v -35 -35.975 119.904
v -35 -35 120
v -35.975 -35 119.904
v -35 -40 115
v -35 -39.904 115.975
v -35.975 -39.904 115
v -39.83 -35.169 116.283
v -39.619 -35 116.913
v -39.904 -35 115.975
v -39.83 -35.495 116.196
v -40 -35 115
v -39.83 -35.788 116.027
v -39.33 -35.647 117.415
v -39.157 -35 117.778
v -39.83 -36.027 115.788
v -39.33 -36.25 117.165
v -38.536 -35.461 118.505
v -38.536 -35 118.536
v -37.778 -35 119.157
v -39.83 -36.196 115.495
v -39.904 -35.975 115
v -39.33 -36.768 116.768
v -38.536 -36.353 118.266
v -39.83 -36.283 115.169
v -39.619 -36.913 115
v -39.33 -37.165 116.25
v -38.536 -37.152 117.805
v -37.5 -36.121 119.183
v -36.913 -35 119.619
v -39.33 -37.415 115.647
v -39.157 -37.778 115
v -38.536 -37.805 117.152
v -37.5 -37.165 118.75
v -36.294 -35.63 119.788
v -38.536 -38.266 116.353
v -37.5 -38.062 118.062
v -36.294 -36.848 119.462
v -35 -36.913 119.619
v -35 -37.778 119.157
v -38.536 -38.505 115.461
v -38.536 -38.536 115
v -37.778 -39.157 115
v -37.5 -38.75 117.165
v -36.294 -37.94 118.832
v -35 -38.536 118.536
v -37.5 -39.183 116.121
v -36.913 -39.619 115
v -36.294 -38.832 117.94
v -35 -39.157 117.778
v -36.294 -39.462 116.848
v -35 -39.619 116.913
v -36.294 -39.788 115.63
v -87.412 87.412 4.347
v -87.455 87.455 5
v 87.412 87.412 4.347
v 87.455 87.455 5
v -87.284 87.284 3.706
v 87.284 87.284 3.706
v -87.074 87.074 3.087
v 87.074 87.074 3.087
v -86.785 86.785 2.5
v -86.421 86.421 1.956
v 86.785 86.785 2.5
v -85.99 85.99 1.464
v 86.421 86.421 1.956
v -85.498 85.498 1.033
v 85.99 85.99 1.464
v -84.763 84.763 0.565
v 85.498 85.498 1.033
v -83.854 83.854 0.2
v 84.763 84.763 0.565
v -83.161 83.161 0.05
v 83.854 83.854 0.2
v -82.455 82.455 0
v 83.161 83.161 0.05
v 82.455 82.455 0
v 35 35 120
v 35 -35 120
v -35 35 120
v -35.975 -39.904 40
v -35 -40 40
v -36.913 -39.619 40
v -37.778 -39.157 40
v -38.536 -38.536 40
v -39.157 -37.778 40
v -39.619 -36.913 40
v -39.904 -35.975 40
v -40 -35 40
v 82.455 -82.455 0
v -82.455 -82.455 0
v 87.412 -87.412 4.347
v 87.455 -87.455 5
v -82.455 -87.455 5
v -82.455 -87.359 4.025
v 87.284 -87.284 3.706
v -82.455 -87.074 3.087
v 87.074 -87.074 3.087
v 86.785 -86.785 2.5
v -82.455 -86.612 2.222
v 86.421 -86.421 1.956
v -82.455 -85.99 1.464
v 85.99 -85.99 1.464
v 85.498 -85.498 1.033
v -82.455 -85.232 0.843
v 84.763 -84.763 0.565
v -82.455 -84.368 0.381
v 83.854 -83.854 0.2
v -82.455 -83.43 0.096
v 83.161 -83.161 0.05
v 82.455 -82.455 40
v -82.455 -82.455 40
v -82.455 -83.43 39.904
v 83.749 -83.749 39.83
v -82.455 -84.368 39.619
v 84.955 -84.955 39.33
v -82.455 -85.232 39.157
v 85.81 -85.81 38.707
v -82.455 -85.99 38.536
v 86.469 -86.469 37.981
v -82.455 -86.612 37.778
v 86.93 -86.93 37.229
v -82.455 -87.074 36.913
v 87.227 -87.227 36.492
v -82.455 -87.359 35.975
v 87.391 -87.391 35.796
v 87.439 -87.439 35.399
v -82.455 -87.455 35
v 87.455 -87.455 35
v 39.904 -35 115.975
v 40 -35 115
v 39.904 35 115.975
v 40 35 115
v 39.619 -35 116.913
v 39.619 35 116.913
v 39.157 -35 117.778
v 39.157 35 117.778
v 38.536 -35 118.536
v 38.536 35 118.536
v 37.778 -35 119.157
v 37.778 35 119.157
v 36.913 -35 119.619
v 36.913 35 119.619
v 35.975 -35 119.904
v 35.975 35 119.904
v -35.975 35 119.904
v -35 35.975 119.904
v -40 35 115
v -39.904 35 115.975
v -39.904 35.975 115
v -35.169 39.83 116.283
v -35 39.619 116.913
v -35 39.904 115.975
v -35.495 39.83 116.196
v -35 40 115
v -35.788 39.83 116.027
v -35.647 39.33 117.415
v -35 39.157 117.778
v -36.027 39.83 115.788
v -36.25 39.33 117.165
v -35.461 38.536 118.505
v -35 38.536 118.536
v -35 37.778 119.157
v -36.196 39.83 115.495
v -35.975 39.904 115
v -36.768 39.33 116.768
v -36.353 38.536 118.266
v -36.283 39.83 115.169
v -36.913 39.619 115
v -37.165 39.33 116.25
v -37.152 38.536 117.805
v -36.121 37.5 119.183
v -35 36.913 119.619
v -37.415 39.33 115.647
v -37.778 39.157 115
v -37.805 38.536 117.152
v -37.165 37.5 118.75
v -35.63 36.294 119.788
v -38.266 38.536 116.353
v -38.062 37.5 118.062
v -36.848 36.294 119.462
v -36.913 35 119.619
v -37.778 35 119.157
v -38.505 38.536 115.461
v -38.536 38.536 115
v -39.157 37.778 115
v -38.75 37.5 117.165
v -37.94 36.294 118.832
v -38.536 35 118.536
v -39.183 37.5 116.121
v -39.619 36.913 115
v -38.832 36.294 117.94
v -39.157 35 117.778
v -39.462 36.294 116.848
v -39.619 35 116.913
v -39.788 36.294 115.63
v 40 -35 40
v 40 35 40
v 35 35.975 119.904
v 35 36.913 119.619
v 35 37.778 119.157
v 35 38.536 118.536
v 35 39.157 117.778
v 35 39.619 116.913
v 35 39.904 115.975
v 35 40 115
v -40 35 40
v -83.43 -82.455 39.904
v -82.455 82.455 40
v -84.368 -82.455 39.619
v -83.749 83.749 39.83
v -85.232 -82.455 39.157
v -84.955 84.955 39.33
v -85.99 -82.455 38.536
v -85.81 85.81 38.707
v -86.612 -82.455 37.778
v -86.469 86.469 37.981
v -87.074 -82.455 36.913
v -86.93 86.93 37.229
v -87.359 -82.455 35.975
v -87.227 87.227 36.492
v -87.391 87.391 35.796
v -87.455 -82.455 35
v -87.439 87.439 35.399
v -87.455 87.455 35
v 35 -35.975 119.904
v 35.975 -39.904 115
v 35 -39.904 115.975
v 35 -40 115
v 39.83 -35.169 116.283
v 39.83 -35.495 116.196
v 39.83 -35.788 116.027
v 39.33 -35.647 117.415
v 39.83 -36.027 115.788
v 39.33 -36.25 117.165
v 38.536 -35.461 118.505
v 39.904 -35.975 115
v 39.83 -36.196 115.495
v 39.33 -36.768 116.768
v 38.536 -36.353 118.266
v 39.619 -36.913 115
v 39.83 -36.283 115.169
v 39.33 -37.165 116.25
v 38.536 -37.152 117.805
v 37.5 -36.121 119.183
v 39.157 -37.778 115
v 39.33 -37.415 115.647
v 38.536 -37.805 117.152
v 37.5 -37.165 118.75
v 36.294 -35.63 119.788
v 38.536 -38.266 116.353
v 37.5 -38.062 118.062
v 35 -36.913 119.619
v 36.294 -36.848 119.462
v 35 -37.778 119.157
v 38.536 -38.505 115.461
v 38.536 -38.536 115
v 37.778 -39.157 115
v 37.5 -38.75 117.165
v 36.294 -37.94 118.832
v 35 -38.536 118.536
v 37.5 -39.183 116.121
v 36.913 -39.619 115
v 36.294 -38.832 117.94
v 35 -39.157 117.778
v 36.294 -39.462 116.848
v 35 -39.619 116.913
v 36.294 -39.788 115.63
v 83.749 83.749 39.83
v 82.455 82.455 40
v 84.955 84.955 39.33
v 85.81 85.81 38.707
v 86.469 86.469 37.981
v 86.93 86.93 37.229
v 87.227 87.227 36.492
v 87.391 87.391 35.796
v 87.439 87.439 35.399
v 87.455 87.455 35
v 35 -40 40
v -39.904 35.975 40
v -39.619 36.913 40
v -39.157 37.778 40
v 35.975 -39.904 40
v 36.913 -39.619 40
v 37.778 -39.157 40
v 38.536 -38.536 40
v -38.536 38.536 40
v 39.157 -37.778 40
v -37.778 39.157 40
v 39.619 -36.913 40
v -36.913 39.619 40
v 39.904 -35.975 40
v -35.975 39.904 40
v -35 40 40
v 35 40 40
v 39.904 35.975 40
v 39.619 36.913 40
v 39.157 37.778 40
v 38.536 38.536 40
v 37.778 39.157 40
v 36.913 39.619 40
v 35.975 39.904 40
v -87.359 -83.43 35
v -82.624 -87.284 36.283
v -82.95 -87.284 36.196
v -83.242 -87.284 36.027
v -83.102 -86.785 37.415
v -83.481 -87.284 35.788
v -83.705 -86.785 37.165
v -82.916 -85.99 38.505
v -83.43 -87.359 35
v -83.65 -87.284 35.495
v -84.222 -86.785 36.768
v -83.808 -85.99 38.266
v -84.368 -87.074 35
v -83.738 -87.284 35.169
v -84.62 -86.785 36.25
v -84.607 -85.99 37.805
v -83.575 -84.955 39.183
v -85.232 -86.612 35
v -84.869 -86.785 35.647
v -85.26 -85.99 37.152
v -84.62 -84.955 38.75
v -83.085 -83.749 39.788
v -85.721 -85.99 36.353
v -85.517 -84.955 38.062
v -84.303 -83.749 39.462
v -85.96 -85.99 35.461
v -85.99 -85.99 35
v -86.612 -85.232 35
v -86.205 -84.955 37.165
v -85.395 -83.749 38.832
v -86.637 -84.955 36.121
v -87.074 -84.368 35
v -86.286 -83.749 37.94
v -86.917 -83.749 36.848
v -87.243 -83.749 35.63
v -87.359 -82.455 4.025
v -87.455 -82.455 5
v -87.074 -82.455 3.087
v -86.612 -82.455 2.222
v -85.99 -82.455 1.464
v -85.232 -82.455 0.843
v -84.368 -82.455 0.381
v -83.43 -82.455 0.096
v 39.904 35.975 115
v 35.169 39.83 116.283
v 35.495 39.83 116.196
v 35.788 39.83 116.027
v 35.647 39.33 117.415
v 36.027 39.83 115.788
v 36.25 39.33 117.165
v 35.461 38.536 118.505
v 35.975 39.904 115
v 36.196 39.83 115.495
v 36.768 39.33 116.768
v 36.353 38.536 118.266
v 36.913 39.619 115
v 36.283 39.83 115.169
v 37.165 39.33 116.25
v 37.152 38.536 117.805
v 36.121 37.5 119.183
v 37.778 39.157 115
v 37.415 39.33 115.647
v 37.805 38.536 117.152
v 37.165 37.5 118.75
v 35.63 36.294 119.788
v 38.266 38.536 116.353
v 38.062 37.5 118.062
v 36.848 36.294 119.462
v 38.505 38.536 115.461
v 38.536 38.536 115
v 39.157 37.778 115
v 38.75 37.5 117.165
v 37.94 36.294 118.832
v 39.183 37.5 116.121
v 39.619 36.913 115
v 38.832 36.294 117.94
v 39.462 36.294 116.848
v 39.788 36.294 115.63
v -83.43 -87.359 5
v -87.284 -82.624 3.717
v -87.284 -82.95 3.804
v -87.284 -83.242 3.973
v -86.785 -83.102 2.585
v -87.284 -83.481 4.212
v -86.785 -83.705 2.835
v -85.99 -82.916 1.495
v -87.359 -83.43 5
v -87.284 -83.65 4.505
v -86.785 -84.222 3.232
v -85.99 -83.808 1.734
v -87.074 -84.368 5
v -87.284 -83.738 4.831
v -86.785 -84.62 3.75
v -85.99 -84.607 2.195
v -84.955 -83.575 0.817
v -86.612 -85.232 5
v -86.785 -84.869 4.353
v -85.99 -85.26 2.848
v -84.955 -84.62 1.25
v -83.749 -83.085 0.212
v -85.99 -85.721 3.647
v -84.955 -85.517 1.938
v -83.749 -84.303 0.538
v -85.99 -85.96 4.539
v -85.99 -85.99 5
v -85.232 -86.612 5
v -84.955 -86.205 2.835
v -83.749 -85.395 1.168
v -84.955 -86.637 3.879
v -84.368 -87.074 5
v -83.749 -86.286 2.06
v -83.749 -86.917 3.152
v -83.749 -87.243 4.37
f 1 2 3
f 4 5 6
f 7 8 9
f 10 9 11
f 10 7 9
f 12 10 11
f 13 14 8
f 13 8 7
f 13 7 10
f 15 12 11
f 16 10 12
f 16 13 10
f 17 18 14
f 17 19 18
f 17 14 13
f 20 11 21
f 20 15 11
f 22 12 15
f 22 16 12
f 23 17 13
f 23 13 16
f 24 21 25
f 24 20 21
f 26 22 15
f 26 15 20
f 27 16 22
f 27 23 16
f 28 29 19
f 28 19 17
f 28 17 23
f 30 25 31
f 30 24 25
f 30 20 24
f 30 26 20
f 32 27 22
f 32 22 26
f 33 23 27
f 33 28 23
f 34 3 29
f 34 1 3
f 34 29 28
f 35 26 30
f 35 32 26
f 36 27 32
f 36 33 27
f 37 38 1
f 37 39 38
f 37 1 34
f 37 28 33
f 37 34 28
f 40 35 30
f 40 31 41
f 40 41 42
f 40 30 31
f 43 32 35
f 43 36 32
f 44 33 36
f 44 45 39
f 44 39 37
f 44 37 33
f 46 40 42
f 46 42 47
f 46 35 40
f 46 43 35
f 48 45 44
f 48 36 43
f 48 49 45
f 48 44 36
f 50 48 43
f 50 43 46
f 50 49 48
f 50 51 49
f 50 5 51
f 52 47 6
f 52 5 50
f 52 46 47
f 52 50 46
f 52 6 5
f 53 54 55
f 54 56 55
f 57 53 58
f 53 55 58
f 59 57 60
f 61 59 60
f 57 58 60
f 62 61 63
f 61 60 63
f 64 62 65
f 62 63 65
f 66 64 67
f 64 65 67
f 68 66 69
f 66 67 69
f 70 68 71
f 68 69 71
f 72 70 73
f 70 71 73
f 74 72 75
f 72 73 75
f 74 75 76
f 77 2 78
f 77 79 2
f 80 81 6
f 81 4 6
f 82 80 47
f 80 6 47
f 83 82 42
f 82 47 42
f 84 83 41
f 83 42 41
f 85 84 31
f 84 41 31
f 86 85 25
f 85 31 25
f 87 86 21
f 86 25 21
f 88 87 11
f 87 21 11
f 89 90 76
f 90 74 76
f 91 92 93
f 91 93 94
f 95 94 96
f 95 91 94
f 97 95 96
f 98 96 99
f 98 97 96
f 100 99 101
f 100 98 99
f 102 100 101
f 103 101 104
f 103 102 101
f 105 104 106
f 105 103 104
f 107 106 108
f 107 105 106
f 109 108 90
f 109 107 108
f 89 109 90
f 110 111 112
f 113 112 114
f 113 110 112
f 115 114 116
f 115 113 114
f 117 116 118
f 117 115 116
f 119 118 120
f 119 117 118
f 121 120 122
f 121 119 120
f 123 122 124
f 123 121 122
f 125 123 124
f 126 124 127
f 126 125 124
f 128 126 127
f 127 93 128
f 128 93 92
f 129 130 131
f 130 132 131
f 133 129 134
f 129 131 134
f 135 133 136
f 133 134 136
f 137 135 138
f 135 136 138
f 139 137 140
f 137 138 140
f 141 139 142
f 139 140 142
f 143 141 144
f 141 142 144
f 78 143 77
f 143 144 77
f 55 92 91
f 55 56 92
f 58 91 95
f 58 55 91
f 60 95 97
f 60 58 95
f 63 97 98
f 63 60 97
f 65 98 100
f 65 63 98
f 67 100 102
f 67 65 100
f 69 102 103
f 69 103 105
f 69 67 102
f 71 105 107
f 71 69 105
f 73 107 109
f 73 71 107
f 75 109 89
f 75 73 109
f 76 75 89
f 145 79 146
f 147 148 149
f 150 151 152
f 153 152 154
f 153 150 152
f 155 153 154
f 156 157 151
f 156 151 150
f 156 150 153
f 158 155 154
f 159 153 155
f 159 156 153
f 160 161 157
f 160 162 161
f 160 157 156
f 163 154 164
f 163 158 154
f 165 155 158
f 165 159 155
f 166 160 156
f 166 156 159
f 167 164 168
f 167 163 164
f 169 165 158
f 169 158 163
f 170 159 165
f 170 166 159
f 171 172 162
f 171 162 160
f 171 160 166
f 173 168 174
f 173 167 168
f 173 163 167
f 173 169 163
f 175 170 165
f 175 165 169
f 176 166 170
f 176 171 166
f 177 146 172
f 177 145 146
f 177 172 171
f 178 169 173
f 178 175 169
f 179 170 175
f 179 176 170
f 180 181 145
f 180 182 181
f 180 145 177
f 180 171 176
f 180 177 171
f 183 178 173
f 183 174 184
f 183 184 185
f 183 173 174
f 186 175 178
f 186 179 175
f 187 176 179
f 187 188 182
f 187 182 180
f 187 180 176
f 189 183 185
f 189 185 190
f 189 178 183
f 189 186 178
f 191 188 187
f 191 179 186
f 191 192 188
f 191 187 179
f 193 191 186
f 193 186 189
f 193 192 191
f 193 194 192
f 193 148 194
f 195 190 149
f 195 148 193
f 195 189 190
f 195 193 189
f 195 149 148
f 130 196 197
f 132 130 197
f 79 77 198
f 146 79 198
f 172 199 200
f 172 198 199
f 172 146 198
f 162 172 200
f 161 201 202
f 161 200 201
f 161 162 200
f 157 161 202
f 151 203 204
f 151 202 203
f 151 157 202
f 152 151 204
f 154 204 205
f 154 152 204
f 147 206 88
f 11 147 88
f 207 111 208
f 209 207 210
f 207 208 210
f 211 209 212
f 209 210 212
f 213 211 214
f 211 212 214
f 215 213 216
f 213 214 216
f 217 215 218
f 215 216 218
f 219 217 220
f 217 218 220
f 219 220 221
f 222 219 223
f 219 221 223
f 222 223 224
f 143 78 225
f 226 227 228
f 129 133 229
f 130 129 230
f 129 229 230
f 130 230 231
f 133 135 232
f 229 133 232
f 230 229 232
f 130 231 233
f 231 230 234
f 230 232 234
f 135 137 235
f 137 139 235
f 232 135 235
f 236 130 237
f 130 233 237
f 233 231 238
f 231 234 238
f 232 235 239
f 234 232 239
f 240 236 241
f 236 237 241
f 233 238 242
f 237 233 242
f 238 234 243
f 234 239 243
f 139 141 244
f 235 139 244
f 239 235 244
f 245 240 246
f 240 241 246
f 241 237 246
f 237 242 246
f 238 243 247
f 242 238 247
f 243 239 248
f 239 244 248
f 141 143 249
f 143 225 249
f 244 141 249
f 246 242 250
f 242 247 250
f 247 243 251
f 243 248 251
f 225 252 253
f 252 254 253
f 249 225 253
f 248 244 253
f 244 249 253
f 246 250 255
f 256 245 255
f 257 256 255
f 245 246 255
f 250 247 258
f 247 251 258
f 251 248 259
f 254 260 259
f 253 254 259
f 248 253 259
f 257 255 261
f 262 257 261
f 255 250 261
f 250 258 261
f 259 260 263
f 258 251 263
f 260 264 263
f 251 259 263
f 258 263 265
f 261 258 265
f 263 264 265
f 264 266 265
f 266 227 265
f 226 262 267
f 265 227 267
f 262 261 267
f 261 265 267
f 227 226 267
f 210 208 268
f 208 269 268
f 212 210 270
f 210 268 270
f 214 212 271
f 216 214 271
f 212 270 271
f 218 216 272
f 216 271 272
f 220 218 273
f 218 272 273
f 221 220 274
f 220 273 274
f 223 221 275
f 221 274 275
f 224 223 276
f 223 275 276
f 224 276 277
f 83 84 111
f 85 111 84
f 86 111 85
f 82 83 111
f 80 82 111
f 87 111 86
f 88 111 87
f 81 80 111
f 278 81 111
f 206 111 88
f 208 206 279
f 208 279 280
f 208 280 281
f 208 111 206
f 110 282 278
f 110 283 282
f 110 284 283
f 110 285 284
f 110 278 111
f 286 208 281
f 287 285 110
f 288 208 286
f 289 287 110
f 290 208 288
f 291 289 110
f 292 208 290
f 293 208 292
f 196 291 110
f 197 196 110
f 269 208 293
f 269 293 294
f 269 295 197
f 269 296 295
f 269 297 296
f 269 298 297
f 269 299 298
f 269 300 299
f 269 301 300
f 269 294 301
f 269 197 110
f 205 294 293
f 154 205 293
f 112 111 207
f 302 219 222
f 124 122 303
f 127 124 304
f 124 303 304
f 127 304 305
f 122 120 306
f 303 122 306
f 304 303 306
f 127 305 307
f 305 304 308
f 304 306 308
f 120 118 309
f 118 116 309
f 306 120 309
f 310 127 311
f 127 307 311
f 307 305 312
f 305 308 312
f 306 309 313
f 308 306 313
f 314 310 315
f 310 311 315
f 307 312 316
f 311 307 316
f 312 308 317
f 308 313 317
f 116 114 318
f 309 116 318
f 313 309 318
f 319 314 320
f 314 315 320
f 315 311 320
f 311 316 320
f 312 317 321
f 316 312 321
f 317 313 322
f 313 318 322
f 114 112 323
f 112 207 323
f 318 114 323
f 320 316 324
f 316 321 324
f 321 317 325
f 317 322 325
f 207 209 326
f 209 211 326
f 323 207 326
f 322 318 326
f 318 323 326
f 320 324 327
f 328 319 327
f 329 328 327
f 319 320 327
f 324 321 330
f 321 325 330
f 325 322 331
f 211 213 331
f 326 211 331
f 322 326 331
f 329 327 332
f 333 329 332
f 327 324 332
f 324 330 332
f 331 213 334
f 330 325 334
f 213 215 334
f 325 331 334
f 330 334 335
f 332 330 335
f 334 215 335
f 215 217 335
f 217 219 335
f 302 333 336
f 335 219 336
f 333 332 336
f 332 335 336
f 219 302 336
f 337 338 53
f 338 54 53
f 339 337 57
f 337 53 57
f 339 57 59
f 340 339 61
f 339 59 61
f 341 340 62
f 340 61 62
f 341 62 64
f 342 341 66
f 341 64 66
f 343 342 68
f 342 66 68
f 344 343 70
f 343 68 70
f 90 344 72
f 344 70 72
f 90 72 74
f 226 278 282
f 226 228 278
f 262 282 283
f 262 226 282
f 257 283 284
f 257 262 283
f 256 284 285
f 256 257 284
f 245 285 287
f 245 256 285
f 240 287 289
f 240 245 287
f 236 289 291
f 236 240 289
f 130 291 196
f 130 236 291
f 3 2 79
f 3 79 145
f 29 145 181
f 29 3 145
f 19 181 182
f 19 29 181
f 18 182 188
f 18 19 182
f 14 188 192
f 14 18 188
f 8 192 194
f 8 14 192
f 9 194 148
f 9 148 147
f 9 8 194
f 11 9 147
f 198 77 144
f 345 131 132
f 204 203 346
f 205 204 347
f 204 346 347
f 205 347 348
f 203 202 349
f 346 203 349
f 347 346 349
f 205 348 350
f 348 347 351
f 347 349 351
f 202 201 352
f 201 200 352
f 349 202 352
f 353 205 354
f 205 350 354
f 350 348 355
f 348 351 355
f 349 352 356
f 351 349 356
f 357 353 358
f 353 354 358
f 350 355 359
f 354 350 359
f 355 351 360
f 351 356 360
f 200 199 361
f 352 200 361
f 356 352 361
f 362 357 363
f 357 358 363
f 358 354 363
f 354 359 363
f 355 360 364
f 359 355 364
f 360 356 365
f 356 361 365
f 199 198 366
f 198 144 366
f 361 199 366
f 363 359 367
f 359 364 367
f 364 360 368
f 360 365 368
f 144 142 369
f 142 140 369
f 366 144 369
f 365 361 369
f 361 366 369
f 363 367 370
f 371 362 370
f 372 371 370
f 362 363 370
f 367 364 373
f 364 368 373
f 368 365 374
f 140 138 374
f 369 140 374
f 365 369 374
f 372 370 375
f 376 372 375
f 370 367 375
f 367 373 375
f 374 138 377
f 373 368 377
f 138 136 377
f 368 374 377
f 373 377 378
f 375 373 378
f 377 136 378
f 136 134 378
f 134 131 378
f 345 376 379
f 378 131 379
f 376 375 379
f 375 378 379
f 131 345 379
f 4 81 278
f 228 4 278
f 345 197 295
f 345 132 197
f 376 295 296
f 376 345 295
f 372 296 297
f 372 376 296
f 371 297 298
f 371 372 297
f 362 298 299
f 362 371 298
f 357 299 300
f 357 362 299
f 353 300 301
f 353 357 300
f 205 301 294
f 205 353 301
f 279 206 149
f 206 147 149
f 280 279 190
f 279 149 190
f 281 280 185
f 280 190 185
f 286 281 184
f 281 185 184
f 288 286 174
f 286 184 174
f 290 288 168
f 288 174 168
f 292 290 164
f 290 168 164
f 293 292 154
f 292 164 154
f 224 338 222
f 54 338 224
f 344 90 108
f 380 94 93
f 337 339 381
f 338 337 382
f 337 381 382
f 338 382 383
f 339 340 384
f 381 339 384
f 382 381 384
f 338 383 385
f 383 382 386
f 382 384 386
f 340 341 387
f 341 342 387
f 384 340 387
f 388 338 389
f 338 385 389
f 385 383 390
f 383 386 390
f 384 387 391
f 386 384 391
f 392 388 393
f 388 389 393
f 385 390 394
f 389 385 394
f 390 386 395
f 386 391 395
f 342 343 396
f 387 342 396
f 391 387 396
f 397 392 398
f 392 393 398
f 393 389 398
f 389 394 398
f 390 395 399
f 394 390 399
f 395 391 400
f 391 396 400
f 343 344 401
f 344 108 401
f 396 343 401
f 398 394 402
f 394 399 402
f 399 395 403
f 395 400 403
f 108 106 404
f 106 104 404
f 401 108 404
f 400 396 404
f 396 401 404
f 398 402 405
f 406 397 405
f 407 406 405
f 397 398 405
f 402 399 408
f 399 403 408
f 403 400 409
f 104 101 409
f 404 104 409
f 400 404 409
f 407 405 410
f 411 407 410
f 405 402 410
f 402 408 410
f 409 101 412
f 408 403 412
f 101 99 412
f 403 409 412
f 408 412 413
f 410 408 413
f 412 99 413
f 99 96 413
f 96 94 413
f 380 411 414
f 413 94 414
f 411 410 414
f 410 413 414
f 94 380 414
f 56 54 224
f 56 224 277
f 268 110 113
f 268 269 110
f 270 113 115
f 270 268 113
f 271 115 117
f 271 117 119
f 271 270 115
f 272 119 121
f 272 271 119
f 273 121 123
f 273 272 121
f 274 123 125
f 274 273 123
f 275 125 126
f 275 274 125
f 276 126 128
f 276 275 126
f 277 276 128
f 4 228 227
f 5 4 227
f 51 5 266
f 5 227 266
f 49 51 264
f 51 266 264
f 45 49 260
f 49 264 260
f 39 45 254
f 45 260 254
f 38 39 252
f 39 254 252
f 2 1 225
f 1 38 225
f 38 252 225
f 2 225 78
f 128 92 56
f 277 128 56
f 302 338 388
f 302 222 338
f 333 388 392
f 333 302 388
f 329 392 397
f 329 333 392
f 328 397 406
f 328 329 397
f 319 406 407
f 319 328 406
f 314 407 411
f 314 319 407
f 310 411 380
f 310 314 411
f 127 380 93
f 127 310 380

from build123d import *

# Parameters (mm, degrees)
F0_W     = 174.909296
F0_H     = 174.909296
F1_DEPTH = 40
F2_DEPTH = 120
F3_R     = 5


with BuildPart() as f1:
    # F0 (on Top) → F1 (new body)
    with BuildSketch(Plane.XY):
        Rectangle(F0_W, F0_H)
        Polygon((40, -40), (0, -40), (-40, -40), (-40, 40), (40, 40), align=None, mode=Mode.SUBTRACT)
    extrude(amount=F1_DEPTH)

    # F0 (on Top) → F2 (join)
    with BuildSketch(Plane.XY):
        Polygon((-40, -40), (0, -40), (40, -40), (40, 40), (-40, 40), align=None)
    extrude(amount=F2_DEPTH)

    # F3
    f3_edges = [f1.edges().sort_by_distance(p)[0] for p in [
        (0, -40, 120),
        (40, 0, 120),
        (-40, 0, 120),
        (0, 40, 120),
        (40, 40, 80),
        (40, -40, 80),
        (-40, -40, 80),
        (-40, 40, 80),
        (-87.454648, 0, 40),
        (0, -87.454648, 40),
        (0, -87.454648, 0),
        (-87.454648, 0, 0),
        (-87.454648, -87.454648, 20),
        (87.454648, 0, 40),
        (87.454648, 0, 0),
        (0, 87.454648, 0),
        (0, 87.454648, 40),
    ]]
    fillet(f3_edges, radius=F3_R)


solid = f1.part
